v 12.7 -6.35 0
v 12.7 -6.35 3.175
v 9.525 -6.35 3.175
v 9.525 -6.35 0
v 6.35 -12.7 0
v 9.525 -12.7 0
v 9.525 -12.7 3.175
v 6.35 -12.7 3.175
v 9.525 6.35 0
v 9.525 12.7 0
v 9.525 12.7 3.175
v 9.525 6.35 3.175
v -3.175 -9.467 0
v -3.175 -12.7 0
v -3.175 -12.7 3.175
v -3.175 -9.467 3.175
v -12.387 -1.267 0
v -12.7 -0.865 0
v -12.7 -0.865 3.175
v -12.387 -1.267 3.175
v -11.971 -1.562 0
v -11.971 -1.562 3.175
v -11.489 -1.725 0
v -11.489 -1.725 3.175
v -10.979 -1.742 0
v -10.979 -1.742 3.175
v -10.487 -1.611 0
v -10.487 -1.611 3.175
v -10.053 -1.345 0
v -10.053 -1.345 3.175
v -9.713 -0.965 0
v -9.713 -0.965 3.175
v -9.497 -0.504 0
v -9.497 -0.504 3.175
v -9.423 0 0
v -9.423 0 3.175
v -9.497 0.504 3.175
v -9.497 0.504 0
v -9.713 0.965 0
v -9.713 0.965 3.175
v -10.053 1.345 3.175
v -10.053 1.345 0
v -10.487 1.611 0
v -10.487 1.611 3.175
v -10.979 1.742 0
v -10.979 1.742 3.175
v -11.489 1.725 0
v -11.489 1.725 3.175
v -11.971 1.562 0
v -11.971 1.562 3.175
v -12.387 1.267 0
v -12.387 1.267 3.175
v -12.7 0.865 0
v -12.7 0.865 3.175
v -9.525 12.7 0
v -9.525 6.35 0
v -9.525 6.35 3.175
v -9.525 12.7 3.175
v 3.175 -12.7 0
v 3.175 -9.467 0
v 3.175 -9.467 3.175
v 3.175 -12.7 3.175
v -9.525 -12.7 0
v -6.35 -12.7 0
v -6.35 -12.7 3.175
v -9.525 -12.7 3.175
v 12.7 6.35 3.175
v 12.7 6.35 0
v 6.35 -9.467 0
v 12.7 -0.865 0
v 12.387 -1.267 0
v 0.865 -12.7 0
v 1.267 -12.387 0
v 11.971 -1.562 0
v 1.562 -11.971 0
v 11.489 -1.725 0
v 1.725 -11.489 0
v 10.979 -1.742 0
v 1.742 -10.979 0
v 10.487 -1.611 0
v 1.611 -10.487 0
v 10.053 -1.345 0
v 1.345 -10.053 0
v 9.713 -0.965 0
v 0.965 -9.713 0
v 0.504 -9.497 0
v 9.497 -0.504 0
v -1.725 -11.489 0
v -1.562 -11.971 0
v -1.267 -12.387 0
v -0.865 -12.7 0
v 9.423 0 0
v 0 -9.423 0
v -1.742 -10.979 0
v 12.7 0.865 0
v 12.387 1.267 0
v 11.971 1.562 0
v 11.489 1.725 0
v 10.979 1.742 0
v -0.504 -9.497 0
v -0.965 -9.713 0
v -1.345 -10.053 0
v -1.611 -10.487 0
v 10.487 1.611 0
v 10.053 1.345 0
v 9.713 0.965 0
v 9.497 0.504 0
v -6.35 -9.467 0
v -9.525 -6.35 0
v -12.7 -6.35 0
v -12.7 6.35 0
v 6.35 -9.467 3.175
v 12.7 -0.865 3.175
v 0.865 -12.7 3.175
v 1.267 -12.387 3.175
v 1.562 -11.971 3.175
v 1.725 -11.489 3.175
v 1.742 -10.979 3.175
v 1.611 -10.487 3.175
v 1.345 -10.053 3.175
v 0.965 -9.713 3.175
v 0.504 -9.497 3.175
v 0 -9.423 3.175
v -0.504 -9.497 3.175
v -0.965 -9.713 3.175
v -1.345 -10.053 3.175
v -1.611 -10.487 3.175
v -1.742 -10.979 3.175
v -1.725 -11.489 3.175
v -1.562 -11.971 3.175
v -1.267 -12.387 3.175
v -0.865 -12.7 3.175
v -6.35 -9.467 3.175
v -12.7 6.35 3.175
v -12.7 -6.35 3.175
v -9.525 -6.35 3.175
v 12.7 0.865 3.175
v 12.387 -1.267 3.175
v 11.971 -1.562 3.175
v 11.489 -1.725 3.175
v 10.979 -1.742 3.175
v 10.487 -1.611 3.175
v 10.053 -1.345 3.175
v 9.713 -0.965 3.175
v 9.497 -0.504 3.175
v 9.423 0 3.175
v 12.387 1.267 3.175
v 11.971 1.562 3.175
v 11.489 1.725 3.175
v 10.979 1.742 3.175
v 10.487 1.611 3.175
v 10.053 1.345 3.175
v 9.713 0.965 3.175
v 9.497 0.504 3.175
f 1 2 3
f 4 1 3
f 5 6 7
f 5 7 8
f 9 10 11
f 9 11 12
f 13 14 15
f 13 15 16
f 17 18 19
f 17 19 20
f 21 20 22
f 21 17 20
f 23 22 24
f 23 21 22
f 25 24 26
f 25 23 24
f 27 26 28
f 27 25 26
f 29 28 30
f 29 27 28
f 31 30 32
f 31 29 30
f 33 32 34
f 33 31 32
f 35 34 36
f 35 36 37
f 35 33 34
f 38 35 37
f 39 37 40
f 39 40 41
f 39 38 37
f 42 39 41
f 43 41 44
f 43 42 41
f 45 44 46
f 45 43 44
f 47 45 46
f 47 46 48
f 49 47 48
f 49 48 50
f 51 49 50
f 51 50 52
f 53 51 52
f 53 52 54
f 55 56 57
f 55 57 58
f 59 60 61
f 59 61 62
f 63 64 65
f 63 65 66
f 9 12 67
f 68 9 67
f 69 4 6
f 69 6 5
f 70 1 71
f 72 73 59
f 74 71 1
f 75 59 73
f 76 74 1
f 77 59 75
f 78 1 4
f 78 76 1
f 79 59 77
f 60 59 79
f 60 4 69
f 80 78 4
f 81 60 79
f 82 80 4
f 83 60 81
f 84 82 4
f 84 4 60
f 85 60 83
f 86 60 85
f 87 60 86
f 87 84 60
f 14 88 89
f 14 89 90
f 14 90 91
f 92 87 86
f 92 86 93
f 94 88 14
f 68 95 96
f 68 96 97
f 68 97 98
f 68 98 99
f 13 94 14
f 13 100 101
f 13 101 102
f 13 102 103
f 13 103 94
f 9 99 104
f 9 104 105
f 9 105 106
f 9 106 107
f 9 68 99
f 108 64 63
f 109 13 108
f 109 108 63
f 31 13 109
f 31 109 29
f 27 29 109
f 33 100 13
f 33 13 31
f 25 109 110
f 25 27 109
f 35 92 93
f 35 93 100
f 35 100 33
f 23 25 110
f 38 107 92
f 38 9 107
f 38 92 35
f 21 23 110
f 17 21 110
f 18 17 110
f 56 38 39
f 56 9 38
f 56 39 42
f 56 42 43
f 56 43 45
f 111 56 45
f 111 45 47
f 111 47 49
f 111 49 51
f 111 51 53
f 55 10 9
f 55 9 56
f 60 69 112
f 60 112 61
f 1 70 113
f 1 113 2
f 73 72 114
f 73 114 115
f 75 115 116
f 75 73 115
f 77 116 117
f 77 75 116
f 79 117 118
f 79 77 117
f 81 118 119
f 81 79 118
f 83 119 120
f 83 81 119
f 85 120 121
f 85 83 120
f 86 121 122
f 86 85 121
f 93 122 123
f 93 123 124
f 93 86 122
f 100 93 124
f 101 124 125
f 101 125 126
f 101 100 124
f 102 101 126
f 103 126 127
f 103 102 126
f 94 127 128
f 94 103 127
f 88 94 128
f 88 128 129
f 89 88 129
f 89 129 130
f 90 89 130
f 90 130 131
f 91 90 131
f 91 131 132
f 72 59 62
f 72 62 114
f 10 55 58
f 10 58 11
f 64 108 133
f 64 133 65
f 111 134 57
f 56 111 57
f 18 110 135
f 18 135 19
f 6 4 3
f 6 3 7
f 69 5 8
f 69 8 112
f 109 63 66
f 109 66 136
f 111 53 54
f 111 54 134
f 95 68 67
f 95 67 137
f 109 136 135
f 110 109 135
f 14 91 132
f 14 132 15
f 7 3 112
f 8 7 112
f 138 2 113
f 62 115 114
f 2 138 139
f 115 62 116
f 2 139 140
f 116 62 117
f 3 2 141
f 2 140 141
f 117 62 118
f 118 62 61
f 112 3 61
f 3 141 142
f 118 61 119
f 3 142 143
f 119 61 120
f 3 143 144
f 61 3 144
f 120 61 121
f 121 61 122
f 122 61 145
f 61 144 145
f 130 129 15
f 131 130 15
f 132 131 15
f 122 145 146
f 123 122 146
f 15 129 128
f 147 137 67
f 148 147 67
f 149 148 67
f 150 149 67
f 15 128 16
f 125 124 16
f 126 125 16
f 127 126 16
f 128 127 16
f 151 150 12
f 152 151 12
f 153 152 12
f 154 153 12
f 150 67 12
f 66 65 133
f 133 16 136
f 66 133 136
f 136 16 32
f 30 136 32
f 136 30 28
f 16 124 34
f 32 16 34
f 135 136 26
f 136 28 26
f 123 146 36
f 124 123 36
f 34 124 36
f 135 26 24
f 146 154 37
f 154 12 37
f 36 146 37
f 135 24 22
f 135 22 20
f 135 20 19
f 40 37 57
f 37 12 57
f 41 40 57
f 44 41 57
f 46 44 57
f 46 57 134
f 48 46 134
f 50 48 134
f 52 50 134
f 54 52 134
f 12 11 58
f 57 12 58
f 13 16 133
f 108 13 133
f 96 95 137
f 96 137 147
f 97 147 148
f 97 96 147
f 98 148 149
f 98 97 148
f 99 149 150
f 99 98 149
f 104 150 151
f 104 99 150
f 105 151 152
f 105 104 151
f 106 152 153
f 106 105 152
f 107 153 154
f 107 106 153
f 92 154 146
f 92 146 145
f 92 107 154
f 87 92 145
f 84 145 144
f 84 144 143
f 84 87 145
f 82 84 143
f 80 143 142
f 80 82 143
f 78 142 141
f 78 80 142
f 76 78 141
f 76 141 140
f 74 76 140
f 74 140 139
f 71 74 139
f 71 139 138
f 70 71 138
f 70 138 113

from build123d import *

# Parameters (mm, degrees)
BOSS_EXTRUDE1_DEPTH = 3.175


with BuildPart() as part:
    # Sketch1 → Boss-Extrude1 (new body)
    with BuildSketch(Plane.XY):
        with BuildLine():
            Line((-9.525, 12.7), (9.525, 12.7))
            Line((9.525, 12.7), (9.525, 6.35))
            Line((9.525, 6.35), (12.7, 6.35))
            Line((12.7, 6.35), (12.7, 0.865465632))
            ThreePointArc((12.7, 0.865465632), (9.4234, 0), (12.7, -0.865465632))
            Line((12.7, -0.865465632), (12.7, -6.35))
            Line((12.7, -6.35), (9.525, -6.35))
            Line((9.525, -6.35), (9.525, -12.7))
            Line((9.525, -12.7), (6.35, -12.7))
            Line((6.35, -12.7), (6.35, -9.467093743))
            Line((6.35, -9.467093743), (3.175, -9.467093743))
            Line((3.175, -9.467093743), (3.175, -12.7))
            Line((3.175, -12.7), (0.865465632, -12.7))
            ThreePointArc((0.865465632, -12.7), (0, -9.4234), (-0.865465632, -12.7))
            Line((-0.865465632, -12.7), (-3.175, -12.7))
            Line((-3.175, -12.7), (-3.175, -9.467093743))
            Line((-3.175, -9.467093743), (-6.35, -9.467093743))
            Line((-6.35, -9.467093743), (-6.35, -12.7))
            Line((-6.35, -12.7), (-9.525, -12.7))
            Line((-9.525, -12.7), (-9.525, -6.35))
            Line((-9.525, -6.35), (-12.7, -6.35))
            Line((-12.7, -6.35), (-12.7, -0.865465632))
            ThreePointArc((-12.7, -0.865465632), (-9.4234, 0), (-12.7, 0.865465632))
            Line((-12.7, 0.865465632), (-12.7, 6.35))
            Line((-12.7, 6.35), (-9.525, 6.35))
            Line((-9.525, 6.35), (-9.525, 12.7))
        make_face()
    extrude(amount=BOSS_EXTRUDE1_DEPTH)


solid = part.part
